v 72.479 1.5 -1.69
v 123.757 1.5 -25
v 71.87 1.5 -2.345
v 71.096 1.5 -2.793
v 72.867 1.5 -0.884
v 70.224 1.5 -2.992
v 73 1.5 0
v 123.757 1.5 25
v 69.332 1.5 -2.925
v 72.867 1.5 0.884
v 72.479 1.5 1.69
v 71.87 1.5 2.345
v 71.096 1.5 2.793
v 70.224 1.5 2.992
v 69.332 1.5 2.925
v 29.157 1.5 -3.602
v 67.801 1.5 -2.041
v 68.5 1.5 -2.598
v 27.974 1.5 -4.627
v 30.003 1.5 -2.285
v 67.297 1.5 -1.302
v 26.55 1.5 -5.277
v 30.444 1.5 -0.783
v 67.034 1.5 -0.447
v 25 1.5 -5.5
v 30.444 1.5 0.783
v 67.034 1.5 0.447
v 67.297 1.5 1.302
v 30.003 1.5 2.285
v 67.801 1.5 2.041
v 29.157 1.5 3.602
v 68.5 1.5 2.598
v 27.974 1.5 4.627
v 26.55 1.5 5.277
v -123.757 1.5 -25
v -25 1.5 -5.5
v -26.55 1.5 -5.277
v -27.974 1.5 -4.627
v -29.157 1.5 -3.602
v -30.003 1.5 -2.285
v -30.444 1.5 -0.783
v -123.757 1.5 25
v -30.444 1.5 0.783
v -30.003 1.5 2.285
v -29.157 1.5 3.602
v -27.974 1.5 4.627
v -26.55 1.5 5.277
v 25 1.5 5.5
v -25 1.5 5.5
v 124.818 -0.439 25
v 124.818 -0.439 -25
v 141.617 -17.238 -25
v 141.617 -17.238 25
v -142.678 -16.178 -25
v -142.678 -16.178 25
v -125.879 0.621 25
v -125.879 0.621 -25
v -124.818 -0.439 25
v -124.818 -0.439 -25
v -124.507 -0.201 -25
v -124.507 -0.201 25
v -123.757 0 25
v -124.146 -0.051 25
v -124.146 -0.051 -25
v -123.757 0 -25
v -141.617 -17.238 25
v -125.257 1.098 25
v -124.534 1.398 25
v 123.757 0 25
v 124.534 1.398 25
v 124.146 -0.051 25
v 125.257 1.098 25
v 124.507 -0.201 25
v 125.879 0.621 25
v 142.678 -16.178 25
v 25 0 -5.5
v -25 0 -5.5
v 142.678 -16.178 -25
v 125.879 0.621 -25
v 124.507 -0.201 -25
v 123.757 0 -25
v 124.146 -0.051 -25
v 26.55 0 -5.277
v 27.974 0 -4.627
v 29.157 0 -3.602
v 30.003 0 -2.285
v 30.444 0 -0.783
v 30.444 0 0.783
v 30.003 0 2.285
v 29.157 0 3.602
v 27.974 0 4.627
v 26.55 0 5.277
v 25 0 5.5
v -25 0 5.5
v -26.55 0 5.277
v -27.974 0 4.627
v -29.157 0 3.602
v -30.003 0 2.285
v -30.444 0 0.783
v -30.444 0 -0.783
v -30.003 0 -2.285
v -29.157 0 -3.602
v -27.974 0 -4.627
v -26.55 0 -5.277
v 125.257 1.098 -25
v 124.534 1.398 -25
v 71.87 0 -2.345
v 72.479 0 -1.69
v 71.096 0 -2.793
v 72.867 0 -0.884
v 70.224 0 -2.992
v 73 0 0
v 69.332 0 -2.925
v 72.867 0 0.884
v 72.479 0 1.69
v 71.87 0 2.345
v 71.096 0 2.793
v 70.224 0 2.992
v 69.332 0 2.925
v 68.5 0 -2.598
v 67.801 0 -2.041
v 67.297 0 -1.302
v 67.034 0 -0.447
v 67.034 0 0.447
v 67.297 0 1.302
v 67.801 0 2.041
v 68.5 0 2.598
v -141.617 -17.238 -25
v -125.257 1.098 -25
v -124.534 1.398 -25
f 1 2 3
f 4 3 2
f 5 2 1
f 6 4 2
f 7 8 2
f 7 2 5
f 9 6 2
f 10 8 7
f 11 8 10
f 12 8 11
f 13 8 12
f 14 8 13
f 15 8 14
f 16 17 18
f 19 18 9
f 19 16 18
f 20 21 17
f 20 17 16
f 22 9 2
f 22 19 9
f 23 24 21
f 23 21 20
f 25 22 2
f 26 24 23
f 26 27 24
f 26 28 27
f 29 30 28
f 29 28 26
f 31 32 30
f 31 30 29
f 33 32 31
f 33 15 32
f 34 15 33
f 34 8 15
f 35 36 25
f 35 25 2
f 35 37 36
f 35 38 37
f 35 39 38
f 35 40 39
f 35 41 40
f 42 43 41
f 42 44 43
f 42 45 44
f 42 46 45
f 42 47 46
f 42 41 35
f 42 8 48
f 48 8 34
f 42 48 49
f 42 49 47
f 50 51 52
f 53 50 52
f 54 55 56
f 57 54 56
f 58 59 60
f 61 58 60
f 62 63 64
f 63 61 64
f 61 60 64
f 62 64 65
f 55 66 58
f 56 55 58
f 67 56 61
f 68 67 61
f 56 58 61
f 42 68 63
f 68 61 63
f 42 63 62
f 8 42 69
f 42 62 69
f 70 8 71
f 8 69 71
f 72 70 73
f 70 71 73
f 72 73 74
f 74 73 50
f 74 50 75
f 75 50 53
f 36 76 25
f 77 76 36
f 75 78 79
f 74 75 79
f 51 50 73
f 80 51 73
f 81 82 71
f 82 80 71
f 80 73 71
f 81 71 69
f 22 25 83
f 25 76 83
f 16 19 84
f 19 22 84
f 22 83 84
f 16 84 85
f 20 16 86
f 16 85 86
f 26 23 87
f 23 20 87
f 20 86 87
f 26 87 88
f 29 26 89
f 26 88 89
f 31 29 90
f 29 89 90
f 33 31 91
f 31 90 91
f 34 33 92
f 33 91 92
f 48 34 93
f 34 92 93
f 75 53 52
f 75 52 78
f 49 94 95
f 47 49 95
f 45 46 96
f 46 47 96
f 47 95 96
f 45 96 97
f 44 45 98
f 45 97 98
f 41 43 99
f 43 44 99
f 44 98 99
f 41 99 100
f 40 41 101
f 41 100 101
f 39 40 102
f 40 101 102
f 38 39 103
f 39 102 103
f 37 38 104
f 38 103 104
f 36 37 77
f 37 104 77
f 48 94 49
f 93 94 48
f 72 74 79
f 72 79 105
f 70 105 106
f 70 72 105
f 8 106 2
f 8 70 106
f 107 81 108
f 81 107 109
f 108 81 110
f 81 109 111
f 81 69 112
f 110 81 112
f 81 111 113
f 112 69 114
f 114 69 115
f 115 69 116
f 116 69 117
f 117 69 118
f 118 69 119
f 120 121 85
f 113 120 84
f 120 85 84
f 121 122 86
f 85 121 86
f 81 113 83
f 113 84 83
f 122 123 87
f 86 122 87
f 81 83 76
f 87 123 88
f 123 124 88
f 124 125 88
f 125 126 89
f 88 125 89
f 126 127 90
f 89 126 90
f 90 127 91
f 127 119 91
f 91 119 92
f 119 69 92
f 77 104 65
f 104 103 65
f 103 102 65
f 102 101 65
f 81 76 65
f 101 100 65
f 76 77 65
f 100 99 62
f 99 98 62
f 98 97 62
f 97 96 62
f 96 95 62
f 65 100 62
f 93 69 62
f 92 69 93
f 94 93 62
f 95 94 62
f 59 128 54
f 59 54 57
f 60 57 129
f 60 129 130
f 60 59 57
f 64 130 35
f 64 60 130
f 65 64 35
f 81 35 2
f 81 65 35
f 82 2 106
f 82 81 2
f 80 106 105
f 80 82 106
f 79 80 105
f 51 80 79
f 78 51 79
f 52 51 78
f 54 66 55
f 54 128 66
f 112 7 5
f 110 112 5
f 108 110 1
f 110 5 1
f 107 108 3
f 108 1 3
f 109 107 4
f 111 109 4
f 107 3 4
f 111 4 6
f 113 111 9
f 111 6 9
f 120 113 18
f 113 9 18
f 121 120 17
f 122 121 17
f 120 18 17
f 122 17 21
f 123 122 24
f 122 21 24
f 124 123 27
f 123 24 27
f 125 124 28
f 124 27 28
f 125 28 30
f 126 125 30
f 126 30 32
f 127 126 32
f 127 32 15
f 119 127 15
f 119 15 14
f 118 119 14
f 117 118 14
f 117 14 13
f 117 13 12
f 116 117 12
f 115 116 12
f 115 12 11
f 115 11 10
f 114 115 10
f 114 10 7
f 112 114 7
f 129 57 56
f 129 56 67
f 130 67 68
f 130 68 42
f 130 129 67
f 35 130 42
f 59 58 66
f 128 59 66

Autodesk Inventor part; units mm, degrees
ref_plane "YZ Plane" through (0, 0, 0) normal (1, 0, 0) x (0, 1, 0)
ref_plane "XZ Plane" through (0, 0, 0) normal (0, 1, 0) x (-1, 0, 0)
ref_plane "XY Plane" through (0, 0, 0) normal (0, 0, 1) x (1, 0, 0)
sketch "Sketch4" plane through (0, 0, 0) normal (0, 1, 0) x (-1, 0, 0)
  line L0 (125, 25) -> (-125, 25)
  line L1 (-125, 25) -> (-125, -25)
  line L2 (-125, -25) -> (125, -25)
  line L3 (125, -25) -> (125, 25)
  line L4 (125, 25) -> (-125, -25) construction
  line L5 (-125, 25) -> (125, -25) construction
  line L6 (25, 0) -> (-25, 0) construction
  line L7 (25, 5.5) -> (-25, 5.5)
  line L8 (-25, -5.5) -> (25, -5.5)
  arc A0 (25, -5.5) -> (25, 5.5) centre (25, 0) ccw
  arc A1 (-25, 5.5) -> (-25, -5.5) centre (-25, 0) ccw
  point P0 (0, 0)
  point P1 (0, 0)
  dimension "d17" = 250
  dimension "d18" = 50
  dimension "d19" = 50
  dimension "d20" = 11
extrude "Plate3" add sketch "Sketch4" along normal blind 1.5
sketch "Sketch6" plane through (-123.9393, 0.4393, -25) normal (-0.7071068, 0.7071068, 0) x (-0.7071068, -0.7071068, 0)
  line L0 (0, 50) -> (0, 0)
  line L1 (0, 0) -> (25, 0)
  line L2 (25, 0) -> (25, 50)
  line L3 (25, 50) -> (0, 50)
edge flange "Flange3" height 25 angle 45 thickness 1.5 bend radius 1.5 thickness toward (-0.7071068, 0.7071068, 0) relief tear relief width 1.5 relief depth 0.75 corner gap 1.5 corner form 0 edges at (-125, 0, 0) (125, 0, 0) wall of the first edge with corners at (-123.9393, 0.4393, 25) (-123.9393, 0.4393, -25) (-141.617, -17.2383, -25) (-141.617, -17.2383, 25)
bend "Bend3"
corner "Corner3"
sketch "Sketch7" plane through (0, 1.5, 0) normal (0, 1, 0) x (1, 0, 0)
  circle A0 centre (70, 0) radius 3
  point P0 (0, 0)
  dimension "d43" = 70
  dimension "d44" = 6
extrude "Cut2" cut sketch "Sketch7" against normal blind 1.5
equation "\"d41\" = Thickness"
equation "\"d2\" = Thickness"
equation "\"d31\" = BendReliefWidth"
equation "\"d32\" = BendReliefDepth"
equation "\"d33\" = MinimumRemnant"
equation "\"d34\" = TransitionRadius"
equation "\"d37\" = BendRadius"
equation "\"d38\" = CornerReliefSize"
equation "\"d39\" = GapSize"
equation "\"d40\" = JacobiRadiusSize"
equation "\"BendRadius\" = Thickness"
equation "\"BendReliefWidth\" = Thickness"
equation "\"BendReliefDepth\" = 0.5 * Thickness"
equation "\"CornerReliefSize\" = 4 * Thickness"
equation "\"MinimumRemnant\" = 2 * Thickness"
equation "\"TransitionRadius\" = BendRadius"
equation "\"JacobiRadiusSize\" = BendRadius"
equation "\"GapSize\" = Thickness"
equation "\"Thickness\" = 1.5"
properties part number "2309HCMUTE-CDT23_TAY-GAT" material "Stainless Steel"
